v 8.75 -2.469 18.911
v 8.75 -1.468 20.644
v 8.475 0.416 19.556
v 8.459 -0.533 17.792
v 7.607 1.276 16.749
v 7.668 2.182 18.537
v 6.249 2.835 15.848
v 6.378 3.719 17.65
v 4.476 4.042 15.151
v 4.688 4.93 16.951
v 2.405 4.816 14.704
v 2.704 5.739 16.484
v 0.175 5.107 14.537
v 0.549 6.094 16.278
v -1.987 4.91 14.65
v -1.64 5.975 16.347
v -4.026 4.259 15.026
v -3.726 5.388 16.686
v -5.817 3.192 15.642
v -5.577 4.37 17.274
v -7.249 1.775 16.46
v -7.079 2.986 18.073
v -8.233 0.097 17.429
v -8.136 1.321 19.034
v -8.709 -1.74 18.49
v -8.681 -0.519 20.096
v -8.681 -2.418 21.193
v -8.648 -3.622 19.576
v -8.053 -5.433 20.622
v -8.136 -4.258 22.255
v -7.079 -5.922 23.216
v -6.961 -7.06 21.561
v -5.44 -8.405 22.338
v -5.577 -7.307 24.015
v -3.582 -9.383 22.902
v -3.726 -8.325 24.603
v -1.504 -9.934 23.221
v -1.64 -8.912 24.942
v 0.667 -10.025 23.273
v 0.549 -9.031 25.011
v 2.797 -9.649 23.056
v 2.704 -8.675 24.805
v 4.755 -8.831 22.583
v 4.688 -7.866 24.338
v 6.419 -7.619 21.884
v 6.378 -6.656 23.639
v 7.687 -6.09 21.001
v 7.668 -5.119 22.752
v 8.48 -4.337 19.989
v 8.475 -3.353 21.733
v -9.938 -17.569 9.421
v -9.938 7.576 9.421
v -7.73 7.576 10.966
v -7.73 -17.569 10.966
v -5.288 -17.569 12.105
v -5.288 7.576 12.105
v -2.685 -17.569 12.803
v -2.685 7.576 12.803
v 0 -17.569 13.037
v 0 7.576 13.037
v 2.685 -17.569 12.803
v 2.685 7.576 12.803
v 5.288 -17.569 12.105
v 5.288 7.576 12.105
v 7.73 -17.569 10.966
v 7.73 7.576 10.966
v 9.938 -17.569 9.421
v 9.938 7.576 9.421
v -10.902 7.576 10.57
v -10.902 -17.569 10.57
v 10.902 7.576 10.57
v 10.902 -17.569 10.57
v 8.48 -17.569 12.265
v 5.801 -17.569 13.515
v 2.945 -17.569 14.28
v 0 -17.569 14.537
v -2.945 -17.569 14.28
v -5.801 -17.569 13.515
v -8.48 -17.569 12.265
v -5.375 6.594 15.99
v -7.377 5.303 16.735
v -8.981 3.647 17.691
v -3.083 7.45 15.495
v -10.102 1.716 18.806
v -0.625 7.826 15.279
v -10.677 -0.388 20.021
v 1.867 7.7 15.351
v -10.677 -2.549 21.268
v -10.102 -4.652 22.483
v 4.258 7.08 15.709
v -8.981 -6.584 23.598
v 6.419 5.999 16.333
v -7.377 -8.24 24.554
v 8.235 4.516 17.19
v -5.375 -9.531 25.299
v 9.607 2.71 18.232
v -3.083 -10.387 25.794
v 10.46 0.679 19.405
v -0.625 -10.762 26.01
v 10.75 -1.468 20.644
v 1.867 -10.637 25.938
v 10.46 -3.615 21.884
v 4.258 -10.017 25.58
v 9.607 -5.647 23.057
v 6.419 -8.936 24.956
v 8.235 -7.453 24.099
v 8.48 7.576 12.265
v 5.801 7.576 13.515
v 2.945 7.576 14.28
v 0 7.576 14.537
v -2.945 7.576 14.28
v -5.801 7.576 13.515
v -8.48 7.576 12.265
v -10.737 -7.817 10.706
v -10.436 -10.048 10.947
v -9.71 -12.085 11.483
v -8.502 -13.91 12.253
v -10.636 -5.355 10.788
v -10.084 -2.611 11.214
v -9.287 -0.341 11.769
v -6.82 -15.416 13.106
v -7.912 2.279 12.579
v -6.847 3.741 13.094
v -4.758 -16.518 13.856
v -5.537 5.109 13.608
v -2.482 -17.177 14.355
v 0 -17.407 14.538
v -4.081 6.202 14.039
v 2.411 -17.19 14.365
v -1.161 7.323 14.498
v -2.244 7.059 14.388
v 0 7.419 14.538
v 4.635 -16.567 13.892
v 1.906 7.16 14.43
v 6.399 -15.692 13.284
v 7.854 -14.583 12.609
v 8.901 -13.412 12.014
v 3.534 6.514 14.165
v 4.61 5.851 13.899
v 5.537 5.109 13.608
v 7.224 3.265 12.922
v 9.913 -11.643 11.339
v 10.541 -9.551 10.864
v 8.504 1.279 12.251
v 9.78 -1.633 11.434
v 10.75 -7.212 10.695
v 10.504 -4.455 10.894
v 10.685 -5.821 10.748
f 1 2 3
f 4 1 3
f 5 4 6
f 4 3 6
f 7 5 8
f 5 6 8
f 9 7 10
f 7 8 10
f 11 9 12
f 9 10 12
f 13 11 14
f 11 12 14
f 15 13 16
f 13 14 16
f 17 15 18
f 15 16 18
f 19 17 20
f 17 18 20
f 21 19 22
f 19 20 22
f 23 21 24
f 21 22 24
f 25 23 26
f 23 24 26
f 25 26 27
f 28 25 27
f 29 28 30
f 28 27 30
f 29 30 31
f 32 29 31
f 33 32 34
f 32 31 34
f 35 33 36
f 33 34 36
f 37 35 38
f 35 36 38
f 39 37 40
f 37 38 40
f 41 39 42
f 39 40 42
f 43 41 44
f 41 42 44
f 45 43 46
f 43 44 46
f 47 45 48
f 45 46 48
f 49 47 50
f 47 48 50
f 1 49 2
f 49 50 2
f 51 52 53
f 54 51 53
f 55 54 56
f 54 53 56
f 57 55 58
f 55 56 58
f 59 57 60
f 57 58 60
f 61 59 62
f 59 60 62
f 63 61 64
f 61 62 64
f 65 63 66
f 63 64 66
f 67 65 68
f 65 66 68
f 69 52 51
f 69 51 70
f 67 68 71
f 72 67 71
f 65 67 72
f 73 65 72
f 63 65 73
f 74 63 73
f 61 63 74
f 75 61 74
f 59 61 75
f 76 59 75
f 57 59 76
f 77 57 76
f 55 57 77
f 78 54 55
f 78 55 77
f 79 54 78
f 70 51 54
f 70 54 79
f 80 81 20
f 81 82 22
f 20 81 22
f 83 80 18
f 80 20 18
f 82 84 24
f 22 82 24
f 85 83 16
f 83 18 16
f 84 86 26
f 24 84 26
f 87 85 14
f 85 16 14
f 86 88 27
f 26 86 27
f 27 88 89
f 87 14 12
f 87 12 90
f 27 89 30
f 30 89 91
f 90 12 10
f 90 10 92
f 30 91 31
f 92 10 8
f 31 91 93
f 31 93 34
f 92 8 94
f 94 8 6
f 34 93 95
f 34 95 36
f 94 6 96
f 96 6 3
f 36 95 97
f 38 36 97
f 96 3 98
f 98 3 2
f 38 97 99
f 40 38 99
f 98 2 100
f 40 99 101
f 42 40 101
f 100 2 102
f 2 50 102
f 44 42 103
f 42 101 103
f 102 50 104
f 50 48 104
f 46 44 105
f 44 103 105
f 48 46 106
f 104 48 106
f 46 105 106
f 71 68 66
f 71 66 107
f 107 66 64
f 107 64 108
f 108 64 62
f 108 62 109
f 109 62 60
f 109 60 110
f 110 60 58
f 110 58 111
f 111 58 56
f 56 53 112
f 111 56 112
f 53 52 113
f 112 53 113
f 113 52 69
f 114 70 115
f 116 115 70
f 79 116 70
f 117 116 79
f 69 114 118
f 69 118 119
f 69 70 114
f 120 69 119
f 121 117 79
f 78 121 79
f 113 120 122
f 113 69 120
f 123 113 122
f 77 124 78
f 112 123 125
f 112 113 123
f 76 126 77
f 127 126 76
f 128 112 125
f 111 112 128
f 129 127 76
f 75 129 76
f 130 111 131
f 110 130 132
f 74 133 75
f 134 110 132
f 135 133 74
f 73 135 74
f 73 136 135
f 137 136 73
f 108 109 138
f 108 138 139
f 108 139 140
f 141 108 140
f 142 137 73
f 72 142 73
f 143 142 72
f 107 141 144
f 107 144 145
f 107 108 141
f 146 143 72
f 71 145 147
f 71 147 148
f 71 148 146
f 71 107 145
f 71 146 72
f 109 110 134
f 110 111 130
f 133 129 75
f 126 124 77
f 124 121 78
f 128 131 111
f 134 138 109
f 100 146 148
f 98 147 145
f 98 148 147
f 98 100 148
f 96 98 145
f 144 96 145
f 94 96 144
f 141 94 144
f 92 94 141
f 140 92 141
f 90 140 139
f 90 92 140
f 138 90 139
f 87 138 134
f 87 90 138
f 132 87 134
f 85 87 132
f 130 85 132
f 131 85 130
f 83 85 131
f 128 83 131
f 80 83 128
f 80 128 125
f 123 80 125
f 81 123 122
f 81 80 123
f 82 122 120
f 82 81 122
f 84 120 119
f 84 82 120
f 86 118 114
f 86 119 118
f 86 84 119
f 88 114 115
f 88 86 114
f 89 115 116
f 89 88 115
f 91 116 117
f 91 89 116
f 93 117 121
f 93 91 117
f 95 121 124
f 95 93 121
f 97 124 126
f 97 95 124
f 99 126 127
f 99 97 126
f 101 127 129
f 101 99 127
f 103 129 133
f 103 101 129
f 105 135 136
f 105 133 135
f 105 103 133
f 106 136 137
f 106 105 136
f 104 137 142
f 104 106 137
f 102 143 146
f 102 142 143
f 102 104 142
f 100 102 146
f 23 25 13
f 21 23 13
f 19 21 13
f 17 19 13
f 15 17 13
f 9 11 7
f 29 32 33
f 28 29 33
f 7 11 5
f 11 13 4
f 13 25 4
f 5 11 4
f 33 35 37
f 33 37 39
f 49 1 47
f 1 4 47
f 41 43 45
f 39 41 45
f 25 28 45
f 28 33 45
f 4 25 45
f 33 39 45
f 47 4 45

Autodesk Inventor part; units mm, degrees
ref_plane "YZ Plane" through (0, 0, 0) normal (1, 0, 0) x (0, 1, 0)
ref_plane "XZ Plane" through (0, 0, 0) normal (0, 1, 0) x (-1, 0, 0)
sketch "Sketch1" plane through (0, 0, 0) normal (1, 0, 0) x (0, 1, 0)
  line L0 (22.9037, 13.0375) -> (-26.2512, 13.0375)
  line L1 (-26.2512, 13.0375) -> (-26.2512, -17.8825)
  line L2 (-26.2512, -17.8825) -> (22.9037, -17.8825)
  line L3 (22.9037, -17.8825) -> (22.9037, 13.0375)
  line L4 (-27.7512, 14.5375) -> (24.4037, 14.5375)
  line L5 (24.4037, 14.5375) -> (24.4037, -19.3825)
  line L6 (24.4037, -19.3825) -> (-27.7512, -19.3825)
  line L7 (-27.7512, -19.3825) -> (-27.7512, 14.5375)
  line L8 (14.8755, 31.453) -> (106.1225, 31.453) construction
  line L9 (5.1094, 14.5375) -> (-10.0461, 23.2875)
  line L10 (-10.0461, 23.2875) -> (-9.0461, 25.0195)
  line L11 (-9.0461, 25.0195) -> (-10.7781, 26.0195)
  line L12 (-10.7781, 26.0195) -> (-17.4073, 14.5375)
  line L13 (24.4037, -2.4225) -> (-27.7512, -2.4225)
  point P0 (0, 0)
  point P1 (22.9037, -2.4225)
  point P2 (-26.2512, -2.4225)
  dimension "d0" = 30.92
  dimension "d1" = 1.5
  dimension "d3" = 17.5
  dimension "d4" = 2
  dimension "d5" = 2
ref_plane "Work Plane1" through (0, -10.7781, 26.0195) normal (0, -0.5, -0.866) x (1, 0, 0)
sketch "Sketch2" plane through (0, -10.7781, 26.0195) normal (0, -0.5, -0.866) x (1, 0, 0)
  line L0 (0, -19.5) -> (0, -2) projected
  circle A0 centre (0, -10.75) radius 8.75
  circle A1 centre (0, -10.75) radius 10.75
  point P0 (0, -22.3439)
  point P1 (0, 0)
extrude "Extrusion1" add sketch "Sketch2" along normal blind 19 contours A0 L0 | L0 A0 | A1
extrude "Extrusion2" cut sketch "Sketch2" along normal blind 2 contours A0 L0 | L0 A0
revolve "Revolution1" add sketch "Sketch1" angle 360 about axis through (0, 24.4037, -2.4225) along (0, -1, 0) contours L0 L1 L13 L7 L4 L5 L3
sketch "Sketch3" plane through (0, 24.4037, -2.4225) normal (0, 1, 0) x (1, 0, 0)
  circle A0 centre (0, 0) radius 15.46 projected
  circle A1 centre (0, 0) radius 16.96 projected
  point P0 (0, -2.4225)
extrude "Extrusion3" cut sketch "Sketch3" against normal blind 127.25 contours A0
sketch "Sketch4" plane through (0, 0, 0) normal (1, 0, 0) x (0, 1, 0)
  line L0 (24.4037, 14.5375) -> (-27.7512, 14.5375) projected
  line L1 (7.5764, 14.5375) -> (27.5764, 14.5375)
  line L2 (27.5764, 14.5375) -> (27.5764, -29.1021)
  line L3 (27.5764, -29.1021) -> (7.5764, -29.1021)
  line L4 (7.5764, -29.1021) -> (7.5764, 14.5375)
  line L5 (-17.5694, 14.5375) -> (-31.1808, 14.5375)
  line L6 (-31.1808, 14.5375) -> (-31.1808, -26.5715)
  line L7 (-31.1808, -26.5715) -> (-17.5694, -26.5715)
  line L8 (-17.5694, -26.5715) -> (-17.5694, 14.5375)
  point P0 (0, 0)
  dimension "d21" = 20
extrude "Extrusion4" cut sketch "Sketch4" along normal mid plane 127.25
sketch "Sketch5" plane through (0, 7.5764, -2.4225) normal (0, 1, 0) x (1, 0, 0)
  circle A0 centre (0, 0) radius 16.96 projected
  line L0 (0, 0) -> (-17.0449, -20.3133)
  line L1 (0, 0) -> (26.5172, 0) construction
  line L2 (0, 0) -> (19.6818, -23.4558)
  line L3 (0, 0) -> (30.6194, 0) construction
  arc A1 (19.6818, -23.4558) -> (-16.96, -20.2121) centre (3.3753, 0.9216) ccw
  dimension "d17" = 130
  dimension "d18" = 50
extrude "Extrusion6" cut sketch "Sketch5" against normal blind 127.25 contours A0 L2 L0 | A0 L0 A1 L2 picked at (-8.1801, -7.6911)
properties part number "1'' copper pipe 60 deg mount"
